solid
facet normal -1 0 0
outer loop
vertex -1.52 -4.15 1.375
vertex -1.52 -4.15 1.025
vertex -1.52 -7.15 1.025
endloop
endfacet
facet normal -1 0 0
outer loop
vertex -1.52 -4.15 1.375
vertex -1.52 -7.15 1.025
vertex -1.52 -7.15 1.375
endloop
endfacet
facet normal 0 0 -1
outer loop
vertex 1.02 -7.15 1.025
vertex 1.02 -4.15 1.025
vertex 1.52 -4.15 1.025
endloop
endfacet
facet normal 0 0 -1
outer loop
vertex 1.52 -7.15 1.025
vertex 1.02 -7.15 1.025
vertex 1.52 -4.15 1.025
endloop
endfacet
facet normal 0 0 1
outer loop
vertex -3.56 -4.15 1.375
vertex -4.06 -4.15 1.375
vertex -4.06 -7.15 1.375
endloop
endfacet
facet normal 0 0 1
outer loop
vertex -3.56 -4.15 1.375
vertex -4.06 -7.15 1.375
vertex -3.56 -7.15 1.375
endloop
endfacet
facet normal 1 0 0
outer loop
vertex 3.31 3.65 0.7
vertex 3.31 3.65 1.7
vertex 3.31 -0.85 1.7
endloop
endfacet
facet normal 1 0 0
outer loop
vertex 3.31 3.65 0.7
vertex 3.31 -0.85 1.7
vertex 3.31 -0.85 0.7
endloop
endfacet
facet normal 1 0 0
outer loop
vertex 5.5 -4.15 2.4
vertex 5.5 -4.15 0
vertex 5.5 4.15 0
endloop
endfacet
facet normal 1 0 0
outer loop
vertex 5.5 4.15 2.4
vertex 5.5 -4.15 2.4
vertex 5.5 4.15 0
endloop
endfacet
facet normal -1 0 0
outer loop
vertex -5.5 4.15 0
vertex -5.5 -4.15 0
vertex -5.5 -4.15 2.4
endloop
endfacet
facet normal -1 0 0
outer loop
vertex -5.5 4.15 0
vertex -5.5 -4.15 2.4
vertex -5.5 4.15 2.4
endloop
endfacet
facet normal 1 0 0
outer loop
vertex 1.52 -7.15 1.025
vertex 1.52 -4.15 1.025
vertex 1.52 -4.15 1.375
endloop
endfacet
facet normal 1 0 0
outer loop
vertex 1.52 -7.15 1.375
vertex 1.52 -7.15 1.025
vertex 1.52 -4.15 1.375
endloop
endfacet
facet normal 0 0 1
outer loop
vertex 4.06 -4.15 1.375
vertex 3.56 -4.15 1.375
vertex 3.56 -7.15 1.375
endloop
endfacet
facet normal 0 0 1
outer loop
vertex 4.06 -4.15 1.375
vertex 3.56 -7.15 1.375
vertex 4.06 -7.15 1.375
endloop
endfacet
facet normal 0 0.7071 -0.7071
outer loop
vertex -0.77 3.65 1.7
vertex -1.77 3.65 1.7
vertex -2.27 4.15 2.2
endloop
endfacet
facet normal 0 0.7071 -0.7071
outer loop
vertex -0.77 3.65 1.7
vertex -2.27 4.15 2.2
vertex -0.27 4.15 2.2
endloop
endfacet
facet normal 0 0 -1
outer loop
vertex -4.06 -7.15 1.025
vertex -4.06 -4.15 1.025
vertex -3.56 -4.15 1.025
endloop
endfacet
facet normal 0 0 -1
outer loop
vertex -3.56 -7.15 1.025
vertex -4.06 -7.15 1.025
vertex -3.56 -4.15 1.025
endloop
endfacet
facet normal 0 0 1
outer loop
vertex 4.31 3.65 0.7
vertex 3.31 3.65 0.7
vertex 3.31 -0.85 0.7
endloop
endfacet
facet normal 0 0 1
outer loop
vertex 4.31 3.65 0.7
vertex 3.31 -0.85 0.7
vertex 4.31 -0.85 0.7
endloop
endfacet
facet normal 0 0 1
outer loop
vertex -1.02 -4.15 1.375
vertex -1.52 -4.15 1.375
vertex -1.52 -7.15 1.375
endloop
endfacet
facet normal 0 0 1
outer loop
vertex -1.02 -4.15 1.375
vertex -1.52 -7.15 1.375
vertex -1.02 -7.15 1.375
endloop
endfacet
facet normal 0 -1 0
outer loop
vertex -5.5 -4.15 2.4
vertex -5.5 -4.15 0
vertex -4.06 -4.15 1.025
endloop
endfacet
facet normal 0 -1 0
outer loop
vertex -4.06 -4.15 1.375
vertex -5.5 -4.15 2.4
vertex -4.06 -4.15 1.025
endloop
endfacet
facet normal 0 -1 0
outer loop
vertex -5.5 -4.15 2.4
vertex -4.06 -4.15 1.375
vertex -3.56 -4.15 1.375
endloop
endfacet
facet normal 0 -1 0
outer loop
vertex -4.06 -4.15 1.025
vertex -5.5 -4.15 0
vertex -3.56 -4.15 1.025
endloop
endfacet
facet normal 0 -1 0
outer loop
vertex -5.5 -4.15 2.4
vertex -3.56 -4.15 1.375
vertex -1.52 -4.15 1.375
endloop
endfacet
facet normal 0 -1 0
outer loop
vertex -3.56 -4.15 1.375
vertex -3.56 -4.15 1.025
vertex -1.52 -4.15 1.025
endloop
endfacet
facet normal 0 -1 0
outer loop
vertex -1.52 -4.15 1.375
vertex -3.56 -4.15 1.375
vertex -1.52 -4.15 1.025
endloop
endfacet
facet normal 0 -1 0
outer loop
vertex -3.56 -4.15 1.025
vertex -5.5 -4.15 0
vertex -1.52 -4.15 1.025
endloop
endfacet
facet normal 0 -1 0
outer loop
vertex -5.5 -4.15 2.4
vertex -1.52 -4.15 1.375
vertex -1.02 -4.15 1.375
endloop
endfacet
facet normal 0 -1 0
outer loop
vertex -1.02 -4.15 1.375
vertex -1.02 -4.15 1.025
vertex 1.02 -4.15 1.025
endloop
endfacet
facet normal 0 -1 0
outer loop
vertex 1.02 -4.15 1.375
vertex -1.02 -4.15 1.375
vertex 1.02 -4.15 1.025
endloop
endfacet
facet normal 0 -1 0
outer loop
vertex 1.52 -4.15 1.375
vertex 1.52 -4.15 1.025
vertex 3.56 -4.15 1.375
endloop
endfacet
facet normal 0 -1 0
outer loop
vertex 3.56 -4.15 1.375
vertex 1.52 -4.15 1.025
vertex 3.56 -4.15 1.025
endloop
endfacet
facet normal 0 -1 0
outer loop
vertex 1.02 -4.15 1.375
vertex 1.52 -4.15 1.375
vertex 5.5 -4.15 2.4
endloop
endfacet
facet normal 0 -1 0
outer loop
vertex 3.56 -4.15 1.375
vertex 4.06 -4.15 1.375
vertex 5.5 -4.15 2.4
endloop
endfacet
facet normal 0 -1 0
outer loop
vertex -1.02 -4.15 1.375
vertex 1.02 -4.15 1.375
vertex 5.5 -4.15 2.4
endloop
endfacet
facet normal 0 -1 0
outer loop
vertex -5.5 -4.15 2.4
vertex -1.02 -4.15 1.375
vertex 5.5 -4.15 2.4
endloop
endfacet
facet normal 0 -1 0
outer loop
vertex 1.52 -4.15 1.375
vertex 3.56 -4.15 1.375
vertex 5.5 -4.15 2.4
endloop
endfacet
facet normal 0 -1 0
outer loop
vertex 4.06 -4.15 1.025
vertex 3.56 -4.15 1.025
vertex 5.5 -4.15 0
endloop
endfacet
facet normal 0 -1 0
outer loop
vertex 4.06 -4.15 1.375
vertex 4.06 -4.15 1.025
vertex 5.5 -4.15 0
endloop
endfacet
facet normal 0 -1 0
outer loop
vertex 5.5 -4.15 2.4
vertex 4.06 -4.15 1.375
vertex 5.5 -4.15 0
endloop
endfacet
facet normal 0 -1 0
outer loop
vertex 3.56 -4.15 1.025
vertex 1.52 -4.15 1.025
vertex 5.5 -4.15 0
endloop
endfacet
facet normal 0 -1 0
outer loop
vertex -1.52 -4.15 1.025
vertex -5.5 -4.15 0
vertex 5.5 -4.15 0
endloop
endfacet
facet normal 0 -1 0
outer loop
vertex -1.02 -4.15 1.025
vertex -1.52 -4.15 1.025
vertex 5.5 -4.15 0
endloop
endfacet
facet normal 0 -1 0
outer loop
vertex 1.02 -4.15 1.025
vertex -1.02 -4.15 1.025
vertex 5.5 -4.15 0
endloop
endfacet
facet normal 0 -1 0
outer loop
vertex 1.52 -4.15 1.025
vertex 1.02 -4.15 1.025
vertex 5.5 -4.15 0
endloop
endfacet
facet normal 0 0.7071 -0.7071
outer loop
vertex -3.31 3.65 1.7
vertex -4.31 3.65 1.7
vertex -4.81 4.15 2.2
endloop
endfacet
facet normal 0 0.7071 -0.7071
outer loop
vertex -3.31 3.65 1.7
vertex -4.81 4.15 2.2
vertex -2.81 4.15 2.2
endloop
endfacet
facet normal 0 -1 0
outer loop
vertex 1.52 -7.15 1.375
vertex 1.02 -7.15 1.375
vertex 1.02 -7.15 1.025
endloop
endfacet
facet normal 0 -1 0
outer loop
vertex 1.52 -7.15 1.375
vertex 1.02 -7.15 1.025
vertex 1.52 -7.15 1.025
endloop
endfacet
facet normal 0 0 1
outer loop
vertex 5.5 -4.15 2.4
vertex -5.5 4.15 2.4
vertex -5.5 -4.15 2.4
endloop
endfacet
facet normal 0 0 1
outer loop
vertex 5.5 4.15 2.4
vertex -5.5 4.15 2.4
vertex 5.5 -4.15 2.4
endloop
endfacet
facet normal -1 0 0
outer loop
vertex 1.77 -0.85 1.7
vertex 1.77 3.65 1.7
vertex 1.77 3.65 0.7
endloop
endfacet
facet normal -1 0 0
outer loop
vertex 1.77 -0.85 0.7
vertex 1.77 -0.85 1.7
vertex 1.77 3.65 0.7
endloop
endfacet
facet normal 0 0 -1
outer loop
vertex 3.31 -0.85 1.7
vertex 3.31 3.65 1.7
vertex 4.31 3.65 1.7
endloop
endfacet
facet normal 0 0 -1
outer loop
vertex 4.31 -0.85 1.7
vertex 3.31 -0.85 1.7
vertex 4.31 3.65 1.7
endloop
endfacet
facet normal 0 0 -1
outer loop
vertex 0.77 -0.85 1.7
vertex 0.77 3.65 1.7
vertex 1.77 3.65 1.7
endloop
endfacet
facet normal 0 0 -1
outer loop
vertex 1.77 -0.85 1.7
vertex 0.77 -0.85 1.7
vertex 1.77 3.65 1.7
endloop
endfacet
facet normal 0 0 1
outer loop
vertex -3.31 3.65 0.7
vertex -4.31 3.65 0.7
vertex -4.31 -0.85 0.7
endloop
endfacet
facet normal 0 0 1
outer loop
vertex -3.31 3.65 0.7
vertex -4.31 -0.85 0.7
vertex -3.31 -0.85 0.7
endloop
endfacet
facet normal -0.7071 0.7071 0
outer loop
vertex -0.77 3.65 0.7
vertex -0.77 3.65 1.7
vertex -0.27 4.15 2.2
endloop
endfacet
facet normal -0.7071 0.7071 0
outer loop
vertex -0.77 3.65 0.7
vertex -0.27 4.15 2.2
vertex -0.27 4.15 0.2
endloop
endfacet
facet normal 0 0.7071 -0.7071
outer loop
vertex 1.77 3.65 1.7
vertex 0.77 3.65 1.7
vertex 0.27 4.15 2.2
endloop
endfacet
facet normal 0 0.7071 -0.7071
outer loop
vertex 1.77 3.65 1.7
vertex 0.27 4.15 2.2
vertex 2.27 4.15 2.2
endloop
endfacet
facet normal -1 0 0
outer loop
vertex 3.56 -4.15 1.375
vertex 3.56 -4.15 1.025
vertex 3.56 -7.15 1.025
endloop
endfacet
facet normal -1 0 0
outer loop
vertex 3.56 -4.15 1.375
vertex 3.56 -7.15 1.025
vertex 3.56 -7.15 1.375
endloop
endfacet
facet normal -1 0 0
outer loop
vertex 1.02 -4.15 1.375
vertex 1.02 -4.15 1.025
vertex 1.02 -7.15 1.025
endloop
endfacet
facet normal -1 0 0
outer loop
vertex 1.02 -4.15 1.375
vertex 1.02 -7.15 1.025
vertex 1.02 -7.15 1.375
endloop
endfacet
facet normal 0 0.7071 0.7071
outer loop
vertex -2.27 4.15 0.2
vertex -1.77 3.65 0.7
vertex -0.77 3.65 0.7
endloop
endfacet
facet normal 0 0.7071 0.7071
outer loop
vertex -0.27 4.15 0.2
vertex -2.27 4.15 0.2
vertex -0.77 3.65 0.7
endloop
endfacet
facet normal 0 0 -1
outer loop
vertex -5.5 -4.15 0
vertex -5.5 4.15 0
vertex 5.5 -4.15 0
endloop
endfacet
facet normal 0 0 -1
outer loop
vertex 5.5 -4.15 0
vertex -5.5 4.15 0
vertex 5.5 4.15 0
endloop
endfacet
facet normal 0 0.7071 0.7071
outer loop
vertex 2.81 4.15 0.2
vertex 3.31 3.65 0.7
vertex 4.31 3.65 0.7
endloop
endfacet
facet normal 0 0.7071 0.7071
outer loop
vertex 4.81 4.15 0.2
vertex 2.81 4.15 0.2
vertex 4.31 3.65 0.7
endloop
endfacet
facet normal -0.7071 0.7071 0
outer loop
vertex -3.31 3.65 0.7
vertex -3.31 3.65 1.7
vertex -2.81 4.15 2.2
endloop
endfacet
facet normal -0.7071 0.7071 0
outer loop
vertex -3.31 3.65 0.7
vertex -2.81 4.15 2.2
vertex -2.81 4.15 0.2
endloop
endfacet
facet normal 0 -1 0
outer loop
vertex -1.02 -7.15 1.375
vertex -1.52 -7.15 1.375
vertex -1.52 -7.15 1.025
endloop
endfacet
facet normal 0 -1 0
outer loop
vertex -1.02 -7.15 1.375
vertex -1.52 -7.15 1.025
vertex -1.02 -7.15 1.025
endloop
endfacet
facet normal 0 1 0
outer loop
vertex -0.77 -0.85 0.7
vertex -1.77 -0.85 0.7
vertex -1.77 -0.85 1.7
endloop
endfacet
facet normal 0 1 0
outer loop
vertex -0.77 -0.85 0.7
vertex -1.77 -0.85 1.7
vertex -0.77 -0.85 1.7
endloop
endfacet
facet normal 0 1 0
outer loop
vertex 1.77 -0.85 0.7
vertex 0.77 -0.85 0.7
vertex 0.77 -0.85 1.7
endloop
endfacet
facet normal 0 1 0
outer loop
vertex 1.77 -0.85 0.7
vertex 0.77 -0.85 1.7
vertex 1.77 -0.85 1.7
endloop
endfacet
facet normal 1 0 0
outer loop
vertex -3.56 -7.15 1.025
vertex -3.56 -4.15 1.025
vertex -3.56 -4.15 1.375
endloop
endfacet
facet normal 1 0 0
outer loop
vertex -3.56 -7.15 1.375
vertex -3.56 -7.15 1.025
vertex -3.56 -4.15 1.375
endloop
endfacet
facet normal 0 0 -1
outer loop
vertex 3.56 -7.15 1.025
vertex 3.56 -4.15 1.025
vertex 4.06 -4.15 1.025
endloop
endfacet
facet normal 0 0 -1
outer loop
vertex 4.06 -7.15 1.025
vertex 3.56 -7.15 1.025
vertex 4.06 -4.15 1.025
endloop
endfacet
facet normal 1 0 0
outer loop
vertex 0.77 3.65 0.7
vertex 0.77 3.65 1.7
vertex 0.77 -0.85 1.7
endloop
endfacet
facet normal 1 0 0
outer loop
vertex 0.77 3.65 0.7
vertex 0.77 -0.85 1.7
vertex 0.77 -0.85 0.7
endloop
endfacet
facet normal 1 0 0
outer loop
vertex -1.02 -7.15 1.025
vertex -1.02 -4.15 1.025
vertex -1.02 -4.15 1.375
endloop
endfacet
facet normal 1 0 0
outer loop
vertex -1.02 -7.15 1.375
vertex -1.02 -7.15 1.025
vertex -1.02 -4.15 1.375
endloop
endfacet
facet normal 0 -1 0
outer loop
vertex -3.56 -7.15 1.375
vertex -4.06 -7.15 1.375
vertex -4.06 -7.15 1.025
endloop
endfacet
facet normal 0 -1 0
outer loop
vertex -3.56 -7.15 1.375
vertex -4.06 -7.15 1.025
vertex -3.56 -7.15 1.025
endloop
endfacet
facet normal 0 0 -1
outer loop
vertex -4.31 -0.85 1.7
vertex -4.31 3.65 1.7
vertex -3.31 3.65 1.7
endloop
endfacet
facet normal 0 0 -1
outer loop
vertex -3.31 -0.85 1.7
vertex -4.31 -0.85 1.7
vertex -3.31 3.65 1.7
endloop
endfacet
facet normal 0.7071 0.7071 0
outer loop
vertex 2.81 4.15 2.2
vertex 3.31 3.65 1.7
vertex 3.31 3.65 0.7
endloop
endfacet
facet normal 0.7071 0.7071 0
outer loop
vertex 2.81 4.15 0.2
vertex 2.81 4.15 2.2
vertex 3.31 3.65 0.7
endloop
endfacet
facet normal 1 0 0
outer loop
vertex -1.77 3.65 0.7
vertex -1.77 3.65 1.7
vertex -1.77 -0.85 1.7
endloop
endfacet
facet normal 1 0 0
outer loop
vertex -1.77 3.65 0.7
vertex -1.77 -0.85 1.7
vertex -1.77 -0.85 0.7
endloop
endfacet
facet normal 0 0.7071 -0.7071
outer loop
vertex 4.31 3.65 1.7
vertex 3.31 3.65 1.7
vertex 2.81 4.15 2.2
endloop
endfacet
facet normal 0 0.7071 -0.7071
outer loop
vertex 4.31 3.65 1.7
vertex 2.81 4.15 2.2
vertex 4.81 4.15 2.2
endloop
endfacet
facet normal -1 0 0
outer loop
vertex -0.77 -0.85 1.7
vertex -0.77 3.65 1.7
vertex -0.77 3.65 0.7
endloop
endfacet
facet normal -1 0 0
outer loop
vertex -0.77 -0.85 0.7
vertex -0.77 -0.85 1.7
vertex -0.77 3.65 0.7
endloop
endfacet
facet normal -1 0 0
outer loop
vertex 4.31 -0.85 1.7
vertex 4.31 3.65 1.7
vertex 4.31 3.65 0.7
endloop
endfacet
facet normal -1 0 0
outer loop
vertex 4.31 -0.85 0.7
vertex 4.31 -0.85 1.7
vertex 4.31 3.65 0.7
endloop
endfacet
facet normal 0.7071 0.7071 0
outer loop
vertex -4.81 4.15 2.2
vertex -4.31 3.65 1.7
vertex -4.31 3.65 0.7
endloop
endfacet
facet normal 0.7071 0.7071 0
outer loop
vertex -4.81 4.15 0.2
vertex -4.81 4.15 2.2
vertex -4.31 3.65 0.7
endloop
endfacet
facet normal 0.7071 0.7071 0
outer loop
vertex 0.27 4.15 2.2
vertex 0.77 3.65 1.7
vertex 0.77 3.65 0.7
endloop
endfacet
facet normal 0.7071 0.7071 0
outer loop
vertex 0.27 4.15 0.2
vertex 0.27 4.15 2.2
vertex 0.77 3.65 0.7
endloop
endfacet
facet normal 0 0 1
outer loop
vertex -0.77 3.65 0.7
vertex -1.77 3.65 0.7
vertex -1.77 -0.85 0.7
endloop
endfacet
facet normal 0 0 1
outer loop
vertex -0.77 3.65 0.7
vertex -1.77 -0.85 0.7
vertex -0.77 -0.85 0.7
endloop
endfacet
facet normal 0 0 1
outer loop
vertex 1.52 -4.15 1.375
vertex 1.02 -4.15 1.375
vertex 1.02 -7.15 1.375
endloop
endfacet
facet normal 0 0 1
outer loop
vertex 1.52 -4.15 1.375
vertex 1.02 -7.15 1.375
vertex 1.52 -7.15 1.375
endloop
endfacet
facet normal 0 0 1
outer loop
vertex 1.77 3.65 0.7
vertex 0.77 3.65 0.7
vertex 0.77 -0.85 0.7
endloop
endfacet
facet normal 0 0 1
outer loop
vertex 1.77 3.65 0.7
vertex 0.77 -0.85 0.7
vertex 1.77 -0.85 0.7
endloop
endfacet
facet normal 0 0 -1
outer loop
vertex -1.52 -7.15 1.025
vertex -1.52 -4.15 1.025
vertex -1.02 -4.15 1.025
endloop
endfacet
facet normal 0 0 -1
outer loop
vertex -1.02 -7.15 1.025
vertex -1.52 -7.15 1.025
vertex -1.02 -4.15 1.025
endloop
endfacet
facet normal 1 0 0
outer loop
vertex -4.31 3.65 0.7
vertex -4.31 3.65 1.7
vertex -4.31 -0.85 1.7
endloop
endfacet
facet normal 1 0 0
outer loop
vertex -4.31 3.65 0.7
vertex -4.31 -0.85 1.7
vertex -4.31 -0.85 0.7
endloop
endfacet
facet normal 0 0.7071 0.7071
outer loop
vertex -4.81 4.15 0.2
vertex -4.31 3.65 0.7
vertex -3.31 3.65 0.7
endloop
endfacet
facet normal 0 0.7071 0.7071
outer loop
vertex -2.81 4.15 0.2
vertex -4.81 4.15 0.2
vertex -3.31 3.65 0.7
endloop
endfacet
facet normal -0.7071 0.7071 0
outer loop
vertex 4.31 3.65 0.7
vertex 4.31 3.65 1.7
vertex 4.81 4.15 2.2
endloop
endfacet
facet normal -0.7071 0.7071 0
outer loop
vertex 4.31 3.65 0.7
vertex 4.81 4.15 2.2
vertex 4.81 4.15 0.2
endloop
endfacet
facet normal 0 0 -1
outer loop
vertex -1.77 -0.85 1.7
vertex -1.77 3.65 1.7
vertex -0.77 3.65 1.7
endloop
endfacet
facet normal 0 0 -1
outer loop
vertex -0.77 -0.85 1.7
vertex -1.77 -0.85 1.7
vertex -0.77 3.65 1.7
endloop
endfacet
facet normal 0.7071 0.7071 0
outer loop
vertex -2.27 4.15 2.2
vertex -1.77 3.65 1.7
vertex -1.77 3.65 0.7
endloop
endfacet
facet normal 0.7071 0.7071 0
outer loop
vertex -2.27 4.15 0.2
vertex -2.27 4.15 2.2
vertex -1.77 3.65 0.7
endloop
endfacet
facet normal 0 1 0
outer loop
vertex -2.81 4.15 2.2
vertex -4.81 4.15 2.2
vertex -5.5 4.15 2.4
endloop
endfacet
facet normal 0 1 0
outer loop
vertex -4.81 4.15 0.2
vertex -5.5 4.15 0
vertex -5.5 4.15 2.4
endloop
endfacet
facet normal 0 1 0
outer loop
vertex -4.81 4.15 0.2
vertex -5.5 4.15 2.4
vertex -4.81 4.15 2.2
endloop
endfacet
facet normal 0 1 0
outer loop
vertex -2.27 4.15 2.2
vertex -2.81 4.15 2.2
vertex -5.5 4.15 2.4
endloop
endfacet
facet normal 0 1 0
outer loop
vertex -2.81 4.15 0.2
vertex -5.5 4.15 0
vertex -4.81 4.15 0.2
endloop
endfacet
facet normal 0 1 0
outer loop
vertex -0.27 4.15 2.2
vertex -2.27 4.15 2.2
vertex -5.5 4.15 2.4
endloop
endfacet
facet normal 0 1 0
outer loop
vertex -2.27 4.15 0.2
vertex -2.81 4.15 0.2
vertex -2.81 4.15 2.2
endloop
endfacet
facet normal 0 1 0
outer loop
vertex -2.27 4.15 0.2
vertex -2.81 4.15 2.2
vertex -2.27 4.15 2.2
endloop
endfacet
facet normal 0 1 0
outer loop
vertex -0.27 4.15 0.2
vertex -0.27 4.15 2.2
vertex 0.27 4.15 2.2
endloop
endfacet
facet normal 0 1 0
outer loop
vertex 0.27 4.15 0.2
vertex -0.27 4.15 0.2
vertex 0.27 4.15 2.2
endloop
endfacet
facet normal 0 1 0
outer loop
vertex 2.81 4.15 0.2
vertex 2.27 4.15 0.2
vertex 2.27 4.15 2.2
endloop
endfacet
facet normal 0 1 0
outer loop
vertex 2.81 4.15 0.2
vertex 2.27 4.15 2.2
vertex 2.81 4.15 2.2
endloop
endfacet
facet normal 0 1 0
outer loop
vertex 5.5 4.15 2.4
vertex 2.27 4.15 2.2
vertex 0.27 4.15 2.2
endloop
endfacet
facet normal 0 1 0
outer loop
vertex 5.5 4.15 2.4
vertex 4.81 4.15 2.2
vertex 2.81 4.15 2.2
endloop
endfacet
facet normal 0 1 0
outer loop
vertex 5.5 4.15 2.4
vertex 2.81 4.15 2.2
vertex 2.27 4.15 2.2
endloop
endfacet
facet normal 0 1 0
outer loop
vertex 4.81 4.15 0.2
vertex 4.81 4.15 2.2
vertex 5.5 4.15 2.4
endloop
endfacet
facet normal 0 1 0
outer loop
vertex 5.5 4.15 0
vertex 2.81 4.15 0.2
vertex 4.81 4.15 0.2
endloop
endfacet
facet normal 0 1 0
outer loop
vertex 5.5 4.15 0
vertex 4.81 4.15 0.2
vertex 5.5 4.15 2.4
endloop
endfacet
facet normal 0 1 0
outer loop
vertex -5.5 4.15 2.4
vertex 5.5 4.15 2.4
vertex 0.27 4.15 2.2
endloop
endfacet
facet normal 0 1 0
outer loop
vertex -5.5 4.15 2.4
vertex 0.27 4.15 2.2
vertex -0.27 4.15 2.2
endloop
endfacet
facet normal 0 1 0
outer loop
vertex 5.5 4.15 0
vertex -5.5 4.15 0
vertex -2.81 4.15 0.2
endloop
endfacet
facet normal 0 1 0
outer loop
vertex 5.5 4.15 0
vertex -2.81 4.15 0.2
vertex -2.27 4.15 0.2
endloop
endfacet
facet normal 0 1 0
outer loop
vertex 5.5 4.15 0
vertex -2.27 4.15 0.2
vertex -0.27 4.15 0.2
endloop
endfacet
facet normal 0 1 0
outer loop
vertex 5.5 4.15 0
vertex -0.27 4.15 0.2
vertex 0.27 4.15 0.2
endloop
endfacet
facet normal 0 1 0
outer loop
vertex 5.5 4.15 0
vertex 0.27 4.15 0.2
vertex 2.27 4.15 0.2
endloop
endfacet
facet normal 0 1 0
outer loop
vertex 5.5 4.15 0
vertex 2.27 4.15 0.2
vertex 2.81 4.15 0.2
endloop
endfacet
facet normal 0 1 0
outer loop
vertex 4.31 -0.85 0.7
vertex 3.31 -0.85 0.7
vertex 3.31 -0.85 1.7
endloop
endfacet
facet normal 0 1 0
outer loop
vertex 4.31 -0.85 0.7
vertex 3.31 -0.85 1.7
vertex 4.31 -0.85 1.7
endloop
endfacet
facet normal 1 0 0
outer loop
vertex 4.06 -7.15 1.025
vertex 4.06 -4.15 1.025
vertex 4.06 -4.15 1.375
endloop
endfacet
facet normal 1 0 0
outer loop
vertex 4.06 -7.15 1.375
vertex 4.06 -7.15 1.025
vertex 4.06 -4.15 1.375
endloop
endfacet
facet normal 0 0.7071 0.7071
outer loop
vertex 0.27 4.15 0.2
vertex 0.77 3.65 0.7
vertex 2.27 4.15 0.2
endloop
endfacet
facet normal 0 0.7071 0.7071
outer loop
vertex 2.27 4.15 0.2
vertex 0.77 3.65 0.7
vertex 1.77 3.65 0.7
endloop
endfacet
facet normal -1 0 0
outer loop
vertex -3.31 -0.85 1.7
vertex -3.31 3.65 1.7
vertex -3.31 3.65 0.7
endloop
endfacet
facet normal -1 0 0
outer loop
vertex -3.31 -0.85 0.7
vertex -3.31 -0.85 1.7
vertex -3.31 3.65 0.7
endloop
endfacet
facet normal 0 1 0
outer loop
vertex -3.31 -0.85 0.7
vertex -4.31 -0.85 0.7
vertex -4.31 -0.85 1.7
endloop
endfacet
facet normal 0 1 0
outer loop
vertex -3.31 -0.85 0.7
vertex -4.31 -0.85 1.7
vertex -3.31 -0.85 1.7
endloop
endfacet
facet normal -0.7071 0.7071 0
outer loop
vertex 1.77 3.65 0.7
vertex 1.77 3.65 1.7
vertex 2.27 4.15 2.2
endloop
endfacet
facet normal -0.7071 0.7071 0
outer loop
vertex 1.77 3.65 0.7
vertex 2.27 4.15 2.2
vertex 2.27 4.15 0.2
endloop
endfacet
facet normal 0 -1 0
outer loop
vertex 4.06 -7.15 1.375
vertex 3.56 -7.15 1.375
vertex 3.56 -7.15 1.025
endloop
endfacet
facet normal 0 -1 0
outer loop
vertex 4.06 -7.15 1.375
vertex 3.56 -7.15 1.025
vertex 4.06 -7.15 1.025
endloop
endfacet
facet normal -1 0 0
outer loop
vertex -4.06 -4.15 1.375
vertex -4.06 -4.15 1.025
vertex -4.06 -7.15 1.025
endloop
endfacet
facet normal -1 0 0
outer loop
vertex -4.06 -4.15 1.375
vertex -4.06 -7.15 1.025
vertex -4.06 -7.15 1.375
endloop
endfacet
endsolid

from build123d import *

# Parameters (mm, degrees)
SKETCH3_W           = 11
SKETCH3_H           = 8.3
BOSS_EXTRUDE1_DEPTH = 2.4
SKETCH5_W           = 1
SKETCH5_H           = 1
CUT_EXTRUDE1_DEPTH  = 5
CHAMFER1_SIZE       = 0.5
SKETCH4_W           = 0.5
SKETCH4_H           = 0.35
BOSS_EXTRUDE2_DEPTH = 3


with BuildPart() as part:
    # Sketch3 → Boss-Extrude1 (new body)
    with BuildSketch(Plane.XY):
        Rectangle(SKETCH3_W, SKETCH3_H)
    extrude(amount=BOSS_EXTRUDE1_DEPTH)

    # Sketch5 → Cut-Extrude1 (cut)
    with BuildSketch(Plane(origin=(0, 4.15, 0), x_dir=(1, 0, 0), z_dir=(0, 1, 0))):
        with Locations((-3.81, -1.2)):
            Rectangle(SKETCH5_W, SKETCH5_H)
        with Locations((-1.27, -1.2)):
            Rectangle(SKETCH5_W, SKETCH5_H)
        with Locations((1.27, -1.2)):
            Rectangle(SKETCH5_W, SKETCH5_H)
        with Locations((3.81, -1.2)):
            Rectangle(SKETCH5_W, SKETCH5_H)
    extrude(amount=-CUT_EXTRUDE1_DEPTH, mode=Mode.SUBTRACT)

    # Chamfer1
    chamfer1_edges = [part.edges().sort_by_distance(p)[0] for p in [
        (-3.31, 4.15, 1.2),
        (-3.81, 4.15, 0.7),
        (-4.31, 4.15, 1.2),
        (-3.81, 4.15, 1.7),
        (-1.27, 4.15, 1.7),
        (-0.77, 4.15, 1.2),
        (-1.27, 4.15, 0.7),
        (-1.77, 4.15, 1.2),
        (1.27, 4.15, 1.7),
        (1.77, 4.15, 1.2),
        (1.27, 4.15, 0.7),
        (0.77, 4.15, 1.2),
        (3.81, 4.15, 1.7),
        (4.31, 4.15, 1.2),
        (3.81, 4.15, 0.7),
        (3.31, 4.15, 1.2),
    ]]
    chamfer(chamfer1_edges, length=CHAMFER1_SIZE)

    # Sketch4 → Boss-Extrude2 (add)
    with BuildSketch(Plane.XZ.offset(4.15)):
        with Locations((-1.27, 1.2)):
            Rectangle(SKETCH4_W, SKETCH4_H)
        with Locations((-3.81, 1.2)):
            Rectangle(SKETCH4_W, SKETCH4_H)
        with Locations((1.27, 1.2)):
            Rectangle(SKETCH4_W, SKETCH4_H)
        with Locations((3.81, 1.2)):
            Rectangle(SKETCH4_W, SKETCH4_H)
    extrude(amount=BOSS_EXTRUDE2_DEPTH)


solid = part.part
